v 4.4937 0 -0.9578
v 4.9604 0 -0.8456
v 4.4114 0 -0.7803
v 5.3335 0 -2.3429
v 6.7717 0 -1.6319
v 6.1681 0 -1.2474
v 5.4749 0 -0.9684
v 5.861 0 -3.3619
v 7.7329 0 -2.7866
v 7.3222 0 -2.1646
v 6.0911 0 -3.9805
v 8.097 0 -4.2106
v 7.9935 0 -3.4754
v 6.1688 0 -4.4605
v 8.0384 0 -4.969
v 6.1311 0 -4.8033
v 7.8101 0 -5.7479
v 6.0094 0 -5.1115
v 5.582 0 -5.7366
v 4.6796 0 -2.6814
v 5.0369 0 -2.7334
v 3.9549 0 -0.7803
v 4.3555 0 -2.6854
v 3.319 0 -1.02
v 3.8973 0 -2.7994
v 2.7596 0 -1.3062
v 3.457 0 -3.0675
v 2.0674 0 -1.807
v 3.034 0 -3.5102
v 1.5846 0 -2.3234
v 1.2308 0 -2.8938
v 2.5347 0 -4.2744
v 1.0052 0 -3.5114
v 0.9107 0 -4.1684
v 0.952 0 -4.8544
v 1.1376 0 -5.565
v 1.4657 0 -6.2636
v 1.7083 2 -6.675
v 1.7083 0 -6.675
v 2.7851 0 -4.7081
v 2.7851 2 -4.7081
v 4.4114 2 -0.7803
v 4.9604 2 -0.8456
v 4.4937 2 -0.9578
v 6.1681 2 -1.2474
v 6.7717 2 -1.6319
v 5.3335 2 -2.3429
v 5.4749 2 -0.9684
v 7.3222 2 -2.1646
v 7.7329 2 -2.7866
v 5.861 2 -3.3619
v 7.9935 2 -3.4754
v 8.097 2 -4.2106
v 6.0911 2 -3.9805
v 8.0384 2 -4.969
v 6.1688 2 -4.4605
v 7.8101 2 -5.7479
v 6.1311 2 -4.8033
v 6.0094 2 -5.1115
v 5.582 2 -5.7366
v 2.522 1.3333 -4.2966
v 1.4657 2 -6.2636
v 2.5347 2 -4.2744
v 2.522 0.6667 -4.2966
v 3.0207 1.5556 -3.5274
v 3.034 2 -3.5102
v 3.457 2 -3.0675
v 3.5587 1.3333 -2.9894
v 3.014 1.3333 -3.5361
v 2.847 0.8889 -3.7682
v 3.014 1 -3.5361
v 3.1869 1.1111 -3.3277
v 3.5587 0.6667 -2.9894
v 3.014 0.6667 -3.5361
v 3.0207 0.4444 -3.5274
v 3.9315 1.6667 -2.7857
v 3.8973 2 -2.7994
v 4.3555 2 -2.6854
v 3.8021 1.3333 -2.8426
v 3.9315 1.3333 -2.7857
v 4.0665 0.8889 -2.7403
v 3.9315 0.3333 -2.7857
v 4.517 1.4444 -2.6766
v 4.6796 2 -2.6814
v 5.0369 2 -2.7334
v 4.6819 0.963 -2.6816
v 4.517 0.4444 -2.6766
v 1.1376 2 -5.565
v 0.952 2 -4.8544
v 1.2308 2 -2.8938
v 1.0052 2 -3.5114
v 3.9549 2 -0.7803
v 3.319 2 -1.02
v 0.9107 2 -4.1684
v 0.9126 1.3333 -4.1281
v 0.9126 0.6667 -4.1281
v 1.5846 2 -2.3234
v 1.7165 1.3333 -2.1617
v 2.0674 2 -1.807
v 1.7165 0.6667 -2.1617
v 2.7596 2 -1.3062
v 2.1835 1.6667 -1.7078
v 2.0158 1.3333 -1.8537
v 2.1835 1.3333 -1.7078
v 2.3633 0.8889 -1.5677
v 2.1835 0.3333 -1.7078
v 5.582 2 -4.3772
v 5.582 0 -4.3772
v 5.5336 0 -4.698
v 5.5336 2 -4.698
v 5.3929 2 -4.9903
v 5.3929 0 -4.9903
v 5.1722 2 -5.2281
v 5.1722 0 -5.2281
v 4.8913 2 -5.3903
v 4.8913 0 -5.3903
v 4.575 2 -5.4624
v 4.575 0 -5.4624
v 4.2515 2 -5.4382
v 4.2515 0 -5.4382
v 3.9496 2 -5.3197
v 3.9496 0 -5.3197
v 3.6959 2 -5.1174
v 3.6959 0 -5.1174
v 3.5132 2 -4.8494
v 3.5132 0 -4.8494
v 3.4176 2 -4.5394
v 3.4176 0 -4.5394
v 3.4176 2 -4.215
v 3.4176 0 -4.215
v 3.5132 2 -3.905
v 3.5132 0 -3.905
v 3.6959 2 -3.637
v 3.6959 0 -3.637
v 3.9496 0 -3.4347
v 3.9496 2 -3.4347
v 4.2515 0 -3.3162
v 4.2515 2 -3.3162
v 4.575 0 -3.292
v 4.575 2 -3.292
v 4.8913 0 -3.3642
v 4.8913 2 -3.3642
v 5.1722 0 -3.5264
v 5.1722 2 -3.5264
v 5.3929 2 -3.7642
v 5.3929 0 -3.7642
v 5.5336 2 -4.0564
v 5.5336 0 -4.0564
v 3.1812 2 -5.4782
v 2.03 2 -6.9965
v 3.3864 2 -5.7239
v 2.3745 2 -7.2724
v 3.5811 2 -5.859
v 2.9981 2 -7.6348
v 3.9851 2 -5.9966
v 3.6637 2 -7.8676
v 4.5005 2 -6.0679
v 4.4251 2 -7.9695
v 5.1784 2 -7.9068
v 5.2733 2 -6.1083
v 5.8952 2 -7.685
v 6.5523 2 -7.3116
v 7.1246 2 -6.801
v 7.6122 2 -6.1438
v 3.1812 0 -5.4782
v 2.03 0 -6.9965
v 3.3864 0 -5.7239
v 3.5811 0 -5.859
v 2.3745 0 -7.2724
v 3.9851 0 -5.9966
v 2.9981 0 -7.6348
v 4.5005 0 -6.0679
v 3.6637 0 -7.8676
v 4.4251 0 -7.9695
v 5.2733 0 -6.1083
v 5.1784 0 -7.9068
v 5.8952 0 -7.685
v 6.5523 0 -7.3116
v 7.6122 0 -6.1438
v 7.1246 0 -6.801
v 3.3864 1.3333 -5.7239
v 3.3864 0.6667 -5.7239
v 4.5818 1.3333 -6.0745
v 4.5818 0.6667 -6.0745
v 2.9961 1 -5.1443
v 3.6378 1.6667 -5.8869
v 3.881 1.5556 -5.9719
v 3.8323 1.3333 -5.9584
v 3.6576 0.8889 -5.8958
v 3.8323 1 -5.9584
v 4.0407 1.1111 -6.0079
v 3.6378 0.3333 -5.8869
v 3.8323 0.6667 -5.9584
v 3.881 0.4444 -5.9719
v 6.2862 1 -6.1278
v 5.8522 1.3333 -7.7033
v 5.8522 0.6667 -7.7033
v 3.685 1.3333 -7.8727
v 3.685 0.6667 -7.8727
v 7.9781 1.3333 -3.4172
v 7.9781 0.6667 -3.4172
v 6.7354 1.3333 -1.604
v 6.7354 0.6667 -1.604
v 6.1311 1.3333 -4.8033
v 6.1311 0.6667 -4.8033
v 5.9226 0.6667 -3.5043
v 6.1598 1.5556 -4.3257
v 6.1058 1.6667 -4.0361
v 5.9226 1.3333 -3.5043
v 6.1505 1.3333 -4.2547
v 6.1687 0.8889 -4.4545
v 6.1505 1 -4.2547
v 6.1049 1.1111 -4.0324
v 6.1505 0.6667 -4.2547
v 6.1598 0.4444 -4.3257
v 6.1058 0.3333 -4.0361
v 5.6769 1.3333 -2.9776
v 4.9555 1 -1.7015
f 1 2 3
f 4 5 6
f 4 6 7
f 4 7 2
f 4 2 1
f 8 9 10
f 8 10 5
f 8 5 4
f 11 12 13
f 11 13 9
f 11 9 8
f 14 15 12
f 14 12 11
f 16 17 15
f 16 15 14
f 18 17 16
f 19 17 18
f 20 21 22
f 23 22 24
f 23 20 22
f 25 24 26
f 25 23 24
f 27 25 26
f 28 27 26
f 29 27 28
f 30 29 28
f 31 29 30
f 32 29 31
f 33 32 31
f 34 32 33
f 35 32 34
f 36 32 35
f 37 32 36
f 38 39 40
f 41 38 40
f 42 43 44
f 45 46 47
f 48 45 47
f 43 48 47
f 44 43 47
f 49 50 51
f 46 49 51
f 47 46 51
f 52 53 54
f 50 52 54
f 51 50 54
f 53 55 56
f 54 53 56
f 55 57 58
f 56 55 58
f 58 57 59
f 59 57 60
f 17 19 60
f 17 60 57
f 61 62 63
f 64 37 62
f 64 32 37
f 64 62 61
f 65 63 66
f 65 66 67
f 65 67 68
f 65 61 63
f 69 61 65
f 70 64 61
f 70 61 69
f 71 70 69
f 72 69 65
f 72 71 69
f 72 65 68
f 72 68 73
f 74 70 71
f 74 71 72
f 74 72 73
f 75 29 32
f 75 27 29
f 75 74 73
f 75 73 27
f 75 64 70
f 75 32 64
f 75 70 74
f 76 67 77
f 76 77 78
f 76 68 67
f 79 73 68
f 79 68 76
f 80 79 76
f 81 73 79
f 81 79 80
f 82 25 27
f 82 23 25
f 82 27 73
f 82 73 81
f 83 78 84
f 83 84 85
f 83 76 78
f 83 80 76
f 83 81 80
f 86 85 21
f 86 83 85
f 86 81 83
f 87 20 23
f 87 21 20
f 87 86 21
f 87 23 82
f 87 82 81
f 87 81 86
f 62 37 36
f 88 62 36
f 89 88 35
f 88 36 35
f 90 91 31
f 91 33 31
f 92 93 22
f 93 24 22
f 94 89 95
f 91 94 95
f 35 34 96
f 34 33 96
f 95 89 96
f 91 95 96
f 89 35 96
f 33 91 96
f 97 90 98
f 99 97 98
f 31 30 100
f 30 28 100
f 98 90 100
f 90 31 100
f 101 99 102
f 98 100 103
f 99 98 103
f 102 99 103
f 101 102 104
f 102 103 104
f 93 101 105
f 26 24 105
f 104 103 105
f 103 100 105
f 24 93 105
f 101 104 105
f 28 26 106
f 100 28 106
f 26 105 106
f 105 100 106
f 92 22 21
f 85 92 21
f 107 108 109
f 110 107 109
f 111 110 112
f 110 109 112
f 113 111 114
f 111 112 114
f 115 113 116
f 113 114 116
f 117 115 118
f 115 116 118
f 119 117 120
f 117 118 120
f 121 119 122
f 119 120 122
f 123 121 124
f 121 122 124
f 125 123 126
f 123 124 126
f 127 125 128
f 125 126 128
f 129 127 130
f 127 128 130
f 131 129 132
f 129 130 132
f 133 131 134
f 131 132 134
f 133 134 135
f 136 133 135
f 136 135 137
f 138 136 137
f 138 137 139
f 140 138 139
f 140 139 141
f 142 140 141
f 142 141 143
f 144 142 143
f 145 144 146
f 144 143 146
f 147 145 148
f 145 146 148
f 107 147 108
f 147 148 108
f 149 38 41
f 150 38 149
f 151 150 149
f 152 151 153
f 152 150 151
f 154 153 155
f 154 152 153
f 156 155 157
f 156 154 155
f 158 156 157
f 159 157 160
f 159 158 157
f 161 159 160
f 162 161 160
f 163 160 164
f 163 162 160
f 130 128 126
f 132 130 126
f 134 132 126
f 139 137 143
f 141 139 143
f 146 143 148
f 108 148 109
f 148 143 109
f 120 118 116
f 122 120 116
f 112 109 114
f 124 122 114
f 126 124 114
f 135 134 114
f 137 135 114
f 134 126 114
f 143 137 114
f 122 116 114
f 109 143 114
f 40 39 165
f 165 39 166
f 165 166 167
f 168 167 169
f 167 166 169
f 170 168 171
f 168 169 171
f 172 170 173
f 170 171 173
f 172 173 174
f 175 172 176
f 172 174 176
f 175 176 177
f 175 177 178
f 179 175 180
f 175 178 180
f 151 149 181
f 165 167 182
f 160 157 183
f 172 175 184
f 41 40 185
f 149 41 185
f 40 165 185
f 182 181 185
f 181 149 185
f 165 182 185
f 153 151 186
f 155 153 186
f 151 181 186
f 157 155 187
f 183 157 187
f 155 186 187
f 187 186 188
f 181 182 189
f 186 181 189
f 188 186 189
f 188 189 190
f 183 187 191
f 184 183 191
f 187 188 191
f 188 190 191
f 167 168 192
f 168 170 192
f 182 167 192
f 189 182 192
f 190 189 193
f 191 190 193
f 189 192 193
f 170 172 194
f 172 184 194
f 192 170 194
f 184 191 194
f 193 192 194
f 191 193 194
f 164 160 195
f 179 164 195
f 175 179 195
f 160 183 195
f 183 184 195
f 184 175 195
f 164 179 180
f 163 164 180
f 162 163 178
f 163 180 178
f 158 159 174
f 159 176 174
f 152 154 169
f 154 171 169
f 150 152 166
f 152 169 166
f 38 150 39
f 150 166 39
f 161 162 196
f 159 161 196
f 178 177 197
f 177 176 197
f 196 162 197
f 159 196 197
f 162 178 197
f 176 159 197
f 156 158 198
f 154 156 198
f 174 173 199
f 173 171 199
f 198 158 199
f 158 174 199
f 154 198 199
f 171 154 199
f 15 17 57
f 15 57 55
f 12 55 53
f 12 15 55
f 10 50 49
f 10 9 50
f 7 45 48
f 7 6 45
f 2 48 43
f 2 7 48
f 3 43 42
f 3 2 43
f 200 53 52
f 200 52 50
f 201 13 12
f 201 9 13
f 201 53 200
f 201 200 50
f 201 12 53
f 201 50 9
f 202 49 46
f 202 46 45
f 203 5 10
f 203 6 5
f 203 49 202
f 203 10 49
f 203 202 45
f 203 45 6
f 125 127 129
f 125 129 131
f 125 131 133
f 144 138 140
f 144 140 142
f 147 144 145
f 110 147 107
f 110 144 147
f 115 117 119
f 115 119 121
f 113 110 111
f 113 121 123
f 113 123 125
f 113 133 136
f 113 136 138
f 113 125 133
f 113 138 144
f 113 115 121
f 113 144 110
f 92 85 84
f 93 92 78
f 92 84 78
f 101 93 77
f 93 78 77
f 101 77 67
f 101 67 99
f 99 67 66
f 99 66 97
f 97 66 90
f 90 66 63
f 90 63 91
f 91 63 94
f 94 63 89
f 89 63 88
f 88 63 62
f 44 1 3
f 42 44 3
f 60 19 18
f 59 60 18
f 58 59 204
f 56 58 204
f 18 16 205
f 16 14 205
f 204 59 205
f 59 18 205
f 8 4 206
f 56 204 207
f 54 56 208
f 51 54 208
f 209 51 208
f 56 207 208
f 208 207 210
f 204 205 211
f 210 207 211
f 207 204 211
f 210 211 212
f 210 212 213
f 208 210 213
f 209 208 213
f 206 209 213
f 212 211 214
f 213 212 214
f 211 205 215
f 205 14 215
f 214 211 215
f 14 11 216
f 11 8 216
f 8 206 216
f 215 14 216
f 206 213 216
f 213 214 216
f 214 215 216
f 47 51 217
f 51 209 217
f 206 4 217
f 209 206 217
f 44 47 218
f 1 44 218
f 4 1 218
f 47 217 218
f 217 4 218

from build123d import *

# Parameters (mm, degrees)
SKETCH1_R             = 1.088272776
BOSS_EXTRUDE1_DEPTH   = 2
BOSS_EXTRUDE1_2_DEPTH = 2
BOSS_EXTRUDE1_3_DEPTH = 2
BOSS_EXTRUDE1_4_DEPTH = 2


with BuildPart() as part:
    # Sketch1 → Boss-Extrude1 (new body)
    with BuildSketch(Plane(origin=(0, 0, 0), x_dir=(1, 0, 0), z_dir=(0, 1, 0))):
        with Locations((4.493692826, 4.377208968)):
            Circle(SKETCH1_R)
    extrude(amount=BOSS_EXTRUDE1_DEPTH)


with BuildPart() as body_2:
    # Sketch1 → Boss-Extrude1 2 (new body)
    with BuildSketch(Plane(origin=(0, 0, 0), x_dir=(1, 0, 0), z_dir=(0, 1, 0))):
        with BuildLine():
            add(Edge.make_bspline(
                [(1.708302736, 6.675020322), (2.7850769, 4.708112849)],
                knots=[0, 0, 1, 1], degree=1))
            add(Edge.make_bspline(
                [(2.7850769, 4.708112849), (3.503027953, 6.18454421), (3.250577965, 6.087201429), (7.612209781, 6.143754191)],
                knots=[0, 0, 0, 0, 1, 1, 1, 1], degree=3))
            add(Edge.make_bspline(
                [(7.612209781, 6.143754191), (6.254944774, 8.405862536), (3.390492052, 8.548738808), (1.708302736, 6.675020322)],
                knots=[0, 0, 0, 0, 1, 1, 1, 1], degree=3))
        make_face()
    extrude(amount=BOSS_EXTRUDE1_2_DEPTH)


with BuildPart() as body_3:
    # Sketch1 → Boss-Extrude1 3 (new body)
    with BuildSketch(Plane(origin=(0, 0, 0), x_dir=(1, 0, 0), z_dir=(0, 1, 0))):
        with BuildLine():
            add(Edge.make_bspline(
                [(5.581965603, 5.736574301), (7.81014445, 5.747884853)],
                knots=[0, 0, 1, 1], degree=1))
            add(Edge.make_bspline(
                [(7.81014445, 5.747884853), (8.793174762, 3.315863121), (7.166280408, 0.951883368), (4.411440439, 0.780285592)],
                knots=[0, 0, 0, 0, 1, 1, 1, 1], degree=3))
            add(Edge.make_bspline(
                [(4.493692826, 0.957799974), (4.411440439, 0.780285592)],
                knots=[0, 0, 1, 1], degree=1))
            add(Edge.make_bspline(
                [(5.581965603, 5.736574301), (6.355689478, 4.69227355), (6.68715092, 4.422069049), (4.493692826, 0.957799974)],
                knots=[0, 0, 0, 0, 1, 1, 1, 1], degree=3))
        make_face()
    extrude(amount=BOSS_EXTRUDE1_3_DEPTH)


with BuildPart() as body_4:
    # Sketch1 → Boss-Extrude1 4 (new body)
    with BuildSketch(Plane(origin=(0, 0, 0), x_dir=(1, 0, 0), z_dir=(0, 1, 0))):
        with BuildLine():
            add(Edge.make_bspline(
                [(1.465683791, 6.263578757), (2.685567613, 4.097099076), (3.184226619, 2.333384223), (5.036898253, 2.733412737)],
                knots=[0, 0, 0, 0, 1, 1, 1, 1], degree=3))
            add(Edge.make_bspline(
                [(3.954884534, 0.780285592), (5.036898253, 2.733412737)],
                knots=[0, 0, 1, 1], degree=1))
            add(Edge.make_bspline(
                [(1.465683791, 6.263578757), (0.260024603, 4.182083143), (0.973294196, 1.73068737), (3.954884534, 0.780285592)],
                knots=[0, 0, 0, 0, 1, 1, 1, 1], degree=3))
        make_face()
    extrude(amount=BOSS_EXTRUDE1_4_DEPTH)


solid = Compound([part.part, body_2.part, body_3.part, body_4.part])
